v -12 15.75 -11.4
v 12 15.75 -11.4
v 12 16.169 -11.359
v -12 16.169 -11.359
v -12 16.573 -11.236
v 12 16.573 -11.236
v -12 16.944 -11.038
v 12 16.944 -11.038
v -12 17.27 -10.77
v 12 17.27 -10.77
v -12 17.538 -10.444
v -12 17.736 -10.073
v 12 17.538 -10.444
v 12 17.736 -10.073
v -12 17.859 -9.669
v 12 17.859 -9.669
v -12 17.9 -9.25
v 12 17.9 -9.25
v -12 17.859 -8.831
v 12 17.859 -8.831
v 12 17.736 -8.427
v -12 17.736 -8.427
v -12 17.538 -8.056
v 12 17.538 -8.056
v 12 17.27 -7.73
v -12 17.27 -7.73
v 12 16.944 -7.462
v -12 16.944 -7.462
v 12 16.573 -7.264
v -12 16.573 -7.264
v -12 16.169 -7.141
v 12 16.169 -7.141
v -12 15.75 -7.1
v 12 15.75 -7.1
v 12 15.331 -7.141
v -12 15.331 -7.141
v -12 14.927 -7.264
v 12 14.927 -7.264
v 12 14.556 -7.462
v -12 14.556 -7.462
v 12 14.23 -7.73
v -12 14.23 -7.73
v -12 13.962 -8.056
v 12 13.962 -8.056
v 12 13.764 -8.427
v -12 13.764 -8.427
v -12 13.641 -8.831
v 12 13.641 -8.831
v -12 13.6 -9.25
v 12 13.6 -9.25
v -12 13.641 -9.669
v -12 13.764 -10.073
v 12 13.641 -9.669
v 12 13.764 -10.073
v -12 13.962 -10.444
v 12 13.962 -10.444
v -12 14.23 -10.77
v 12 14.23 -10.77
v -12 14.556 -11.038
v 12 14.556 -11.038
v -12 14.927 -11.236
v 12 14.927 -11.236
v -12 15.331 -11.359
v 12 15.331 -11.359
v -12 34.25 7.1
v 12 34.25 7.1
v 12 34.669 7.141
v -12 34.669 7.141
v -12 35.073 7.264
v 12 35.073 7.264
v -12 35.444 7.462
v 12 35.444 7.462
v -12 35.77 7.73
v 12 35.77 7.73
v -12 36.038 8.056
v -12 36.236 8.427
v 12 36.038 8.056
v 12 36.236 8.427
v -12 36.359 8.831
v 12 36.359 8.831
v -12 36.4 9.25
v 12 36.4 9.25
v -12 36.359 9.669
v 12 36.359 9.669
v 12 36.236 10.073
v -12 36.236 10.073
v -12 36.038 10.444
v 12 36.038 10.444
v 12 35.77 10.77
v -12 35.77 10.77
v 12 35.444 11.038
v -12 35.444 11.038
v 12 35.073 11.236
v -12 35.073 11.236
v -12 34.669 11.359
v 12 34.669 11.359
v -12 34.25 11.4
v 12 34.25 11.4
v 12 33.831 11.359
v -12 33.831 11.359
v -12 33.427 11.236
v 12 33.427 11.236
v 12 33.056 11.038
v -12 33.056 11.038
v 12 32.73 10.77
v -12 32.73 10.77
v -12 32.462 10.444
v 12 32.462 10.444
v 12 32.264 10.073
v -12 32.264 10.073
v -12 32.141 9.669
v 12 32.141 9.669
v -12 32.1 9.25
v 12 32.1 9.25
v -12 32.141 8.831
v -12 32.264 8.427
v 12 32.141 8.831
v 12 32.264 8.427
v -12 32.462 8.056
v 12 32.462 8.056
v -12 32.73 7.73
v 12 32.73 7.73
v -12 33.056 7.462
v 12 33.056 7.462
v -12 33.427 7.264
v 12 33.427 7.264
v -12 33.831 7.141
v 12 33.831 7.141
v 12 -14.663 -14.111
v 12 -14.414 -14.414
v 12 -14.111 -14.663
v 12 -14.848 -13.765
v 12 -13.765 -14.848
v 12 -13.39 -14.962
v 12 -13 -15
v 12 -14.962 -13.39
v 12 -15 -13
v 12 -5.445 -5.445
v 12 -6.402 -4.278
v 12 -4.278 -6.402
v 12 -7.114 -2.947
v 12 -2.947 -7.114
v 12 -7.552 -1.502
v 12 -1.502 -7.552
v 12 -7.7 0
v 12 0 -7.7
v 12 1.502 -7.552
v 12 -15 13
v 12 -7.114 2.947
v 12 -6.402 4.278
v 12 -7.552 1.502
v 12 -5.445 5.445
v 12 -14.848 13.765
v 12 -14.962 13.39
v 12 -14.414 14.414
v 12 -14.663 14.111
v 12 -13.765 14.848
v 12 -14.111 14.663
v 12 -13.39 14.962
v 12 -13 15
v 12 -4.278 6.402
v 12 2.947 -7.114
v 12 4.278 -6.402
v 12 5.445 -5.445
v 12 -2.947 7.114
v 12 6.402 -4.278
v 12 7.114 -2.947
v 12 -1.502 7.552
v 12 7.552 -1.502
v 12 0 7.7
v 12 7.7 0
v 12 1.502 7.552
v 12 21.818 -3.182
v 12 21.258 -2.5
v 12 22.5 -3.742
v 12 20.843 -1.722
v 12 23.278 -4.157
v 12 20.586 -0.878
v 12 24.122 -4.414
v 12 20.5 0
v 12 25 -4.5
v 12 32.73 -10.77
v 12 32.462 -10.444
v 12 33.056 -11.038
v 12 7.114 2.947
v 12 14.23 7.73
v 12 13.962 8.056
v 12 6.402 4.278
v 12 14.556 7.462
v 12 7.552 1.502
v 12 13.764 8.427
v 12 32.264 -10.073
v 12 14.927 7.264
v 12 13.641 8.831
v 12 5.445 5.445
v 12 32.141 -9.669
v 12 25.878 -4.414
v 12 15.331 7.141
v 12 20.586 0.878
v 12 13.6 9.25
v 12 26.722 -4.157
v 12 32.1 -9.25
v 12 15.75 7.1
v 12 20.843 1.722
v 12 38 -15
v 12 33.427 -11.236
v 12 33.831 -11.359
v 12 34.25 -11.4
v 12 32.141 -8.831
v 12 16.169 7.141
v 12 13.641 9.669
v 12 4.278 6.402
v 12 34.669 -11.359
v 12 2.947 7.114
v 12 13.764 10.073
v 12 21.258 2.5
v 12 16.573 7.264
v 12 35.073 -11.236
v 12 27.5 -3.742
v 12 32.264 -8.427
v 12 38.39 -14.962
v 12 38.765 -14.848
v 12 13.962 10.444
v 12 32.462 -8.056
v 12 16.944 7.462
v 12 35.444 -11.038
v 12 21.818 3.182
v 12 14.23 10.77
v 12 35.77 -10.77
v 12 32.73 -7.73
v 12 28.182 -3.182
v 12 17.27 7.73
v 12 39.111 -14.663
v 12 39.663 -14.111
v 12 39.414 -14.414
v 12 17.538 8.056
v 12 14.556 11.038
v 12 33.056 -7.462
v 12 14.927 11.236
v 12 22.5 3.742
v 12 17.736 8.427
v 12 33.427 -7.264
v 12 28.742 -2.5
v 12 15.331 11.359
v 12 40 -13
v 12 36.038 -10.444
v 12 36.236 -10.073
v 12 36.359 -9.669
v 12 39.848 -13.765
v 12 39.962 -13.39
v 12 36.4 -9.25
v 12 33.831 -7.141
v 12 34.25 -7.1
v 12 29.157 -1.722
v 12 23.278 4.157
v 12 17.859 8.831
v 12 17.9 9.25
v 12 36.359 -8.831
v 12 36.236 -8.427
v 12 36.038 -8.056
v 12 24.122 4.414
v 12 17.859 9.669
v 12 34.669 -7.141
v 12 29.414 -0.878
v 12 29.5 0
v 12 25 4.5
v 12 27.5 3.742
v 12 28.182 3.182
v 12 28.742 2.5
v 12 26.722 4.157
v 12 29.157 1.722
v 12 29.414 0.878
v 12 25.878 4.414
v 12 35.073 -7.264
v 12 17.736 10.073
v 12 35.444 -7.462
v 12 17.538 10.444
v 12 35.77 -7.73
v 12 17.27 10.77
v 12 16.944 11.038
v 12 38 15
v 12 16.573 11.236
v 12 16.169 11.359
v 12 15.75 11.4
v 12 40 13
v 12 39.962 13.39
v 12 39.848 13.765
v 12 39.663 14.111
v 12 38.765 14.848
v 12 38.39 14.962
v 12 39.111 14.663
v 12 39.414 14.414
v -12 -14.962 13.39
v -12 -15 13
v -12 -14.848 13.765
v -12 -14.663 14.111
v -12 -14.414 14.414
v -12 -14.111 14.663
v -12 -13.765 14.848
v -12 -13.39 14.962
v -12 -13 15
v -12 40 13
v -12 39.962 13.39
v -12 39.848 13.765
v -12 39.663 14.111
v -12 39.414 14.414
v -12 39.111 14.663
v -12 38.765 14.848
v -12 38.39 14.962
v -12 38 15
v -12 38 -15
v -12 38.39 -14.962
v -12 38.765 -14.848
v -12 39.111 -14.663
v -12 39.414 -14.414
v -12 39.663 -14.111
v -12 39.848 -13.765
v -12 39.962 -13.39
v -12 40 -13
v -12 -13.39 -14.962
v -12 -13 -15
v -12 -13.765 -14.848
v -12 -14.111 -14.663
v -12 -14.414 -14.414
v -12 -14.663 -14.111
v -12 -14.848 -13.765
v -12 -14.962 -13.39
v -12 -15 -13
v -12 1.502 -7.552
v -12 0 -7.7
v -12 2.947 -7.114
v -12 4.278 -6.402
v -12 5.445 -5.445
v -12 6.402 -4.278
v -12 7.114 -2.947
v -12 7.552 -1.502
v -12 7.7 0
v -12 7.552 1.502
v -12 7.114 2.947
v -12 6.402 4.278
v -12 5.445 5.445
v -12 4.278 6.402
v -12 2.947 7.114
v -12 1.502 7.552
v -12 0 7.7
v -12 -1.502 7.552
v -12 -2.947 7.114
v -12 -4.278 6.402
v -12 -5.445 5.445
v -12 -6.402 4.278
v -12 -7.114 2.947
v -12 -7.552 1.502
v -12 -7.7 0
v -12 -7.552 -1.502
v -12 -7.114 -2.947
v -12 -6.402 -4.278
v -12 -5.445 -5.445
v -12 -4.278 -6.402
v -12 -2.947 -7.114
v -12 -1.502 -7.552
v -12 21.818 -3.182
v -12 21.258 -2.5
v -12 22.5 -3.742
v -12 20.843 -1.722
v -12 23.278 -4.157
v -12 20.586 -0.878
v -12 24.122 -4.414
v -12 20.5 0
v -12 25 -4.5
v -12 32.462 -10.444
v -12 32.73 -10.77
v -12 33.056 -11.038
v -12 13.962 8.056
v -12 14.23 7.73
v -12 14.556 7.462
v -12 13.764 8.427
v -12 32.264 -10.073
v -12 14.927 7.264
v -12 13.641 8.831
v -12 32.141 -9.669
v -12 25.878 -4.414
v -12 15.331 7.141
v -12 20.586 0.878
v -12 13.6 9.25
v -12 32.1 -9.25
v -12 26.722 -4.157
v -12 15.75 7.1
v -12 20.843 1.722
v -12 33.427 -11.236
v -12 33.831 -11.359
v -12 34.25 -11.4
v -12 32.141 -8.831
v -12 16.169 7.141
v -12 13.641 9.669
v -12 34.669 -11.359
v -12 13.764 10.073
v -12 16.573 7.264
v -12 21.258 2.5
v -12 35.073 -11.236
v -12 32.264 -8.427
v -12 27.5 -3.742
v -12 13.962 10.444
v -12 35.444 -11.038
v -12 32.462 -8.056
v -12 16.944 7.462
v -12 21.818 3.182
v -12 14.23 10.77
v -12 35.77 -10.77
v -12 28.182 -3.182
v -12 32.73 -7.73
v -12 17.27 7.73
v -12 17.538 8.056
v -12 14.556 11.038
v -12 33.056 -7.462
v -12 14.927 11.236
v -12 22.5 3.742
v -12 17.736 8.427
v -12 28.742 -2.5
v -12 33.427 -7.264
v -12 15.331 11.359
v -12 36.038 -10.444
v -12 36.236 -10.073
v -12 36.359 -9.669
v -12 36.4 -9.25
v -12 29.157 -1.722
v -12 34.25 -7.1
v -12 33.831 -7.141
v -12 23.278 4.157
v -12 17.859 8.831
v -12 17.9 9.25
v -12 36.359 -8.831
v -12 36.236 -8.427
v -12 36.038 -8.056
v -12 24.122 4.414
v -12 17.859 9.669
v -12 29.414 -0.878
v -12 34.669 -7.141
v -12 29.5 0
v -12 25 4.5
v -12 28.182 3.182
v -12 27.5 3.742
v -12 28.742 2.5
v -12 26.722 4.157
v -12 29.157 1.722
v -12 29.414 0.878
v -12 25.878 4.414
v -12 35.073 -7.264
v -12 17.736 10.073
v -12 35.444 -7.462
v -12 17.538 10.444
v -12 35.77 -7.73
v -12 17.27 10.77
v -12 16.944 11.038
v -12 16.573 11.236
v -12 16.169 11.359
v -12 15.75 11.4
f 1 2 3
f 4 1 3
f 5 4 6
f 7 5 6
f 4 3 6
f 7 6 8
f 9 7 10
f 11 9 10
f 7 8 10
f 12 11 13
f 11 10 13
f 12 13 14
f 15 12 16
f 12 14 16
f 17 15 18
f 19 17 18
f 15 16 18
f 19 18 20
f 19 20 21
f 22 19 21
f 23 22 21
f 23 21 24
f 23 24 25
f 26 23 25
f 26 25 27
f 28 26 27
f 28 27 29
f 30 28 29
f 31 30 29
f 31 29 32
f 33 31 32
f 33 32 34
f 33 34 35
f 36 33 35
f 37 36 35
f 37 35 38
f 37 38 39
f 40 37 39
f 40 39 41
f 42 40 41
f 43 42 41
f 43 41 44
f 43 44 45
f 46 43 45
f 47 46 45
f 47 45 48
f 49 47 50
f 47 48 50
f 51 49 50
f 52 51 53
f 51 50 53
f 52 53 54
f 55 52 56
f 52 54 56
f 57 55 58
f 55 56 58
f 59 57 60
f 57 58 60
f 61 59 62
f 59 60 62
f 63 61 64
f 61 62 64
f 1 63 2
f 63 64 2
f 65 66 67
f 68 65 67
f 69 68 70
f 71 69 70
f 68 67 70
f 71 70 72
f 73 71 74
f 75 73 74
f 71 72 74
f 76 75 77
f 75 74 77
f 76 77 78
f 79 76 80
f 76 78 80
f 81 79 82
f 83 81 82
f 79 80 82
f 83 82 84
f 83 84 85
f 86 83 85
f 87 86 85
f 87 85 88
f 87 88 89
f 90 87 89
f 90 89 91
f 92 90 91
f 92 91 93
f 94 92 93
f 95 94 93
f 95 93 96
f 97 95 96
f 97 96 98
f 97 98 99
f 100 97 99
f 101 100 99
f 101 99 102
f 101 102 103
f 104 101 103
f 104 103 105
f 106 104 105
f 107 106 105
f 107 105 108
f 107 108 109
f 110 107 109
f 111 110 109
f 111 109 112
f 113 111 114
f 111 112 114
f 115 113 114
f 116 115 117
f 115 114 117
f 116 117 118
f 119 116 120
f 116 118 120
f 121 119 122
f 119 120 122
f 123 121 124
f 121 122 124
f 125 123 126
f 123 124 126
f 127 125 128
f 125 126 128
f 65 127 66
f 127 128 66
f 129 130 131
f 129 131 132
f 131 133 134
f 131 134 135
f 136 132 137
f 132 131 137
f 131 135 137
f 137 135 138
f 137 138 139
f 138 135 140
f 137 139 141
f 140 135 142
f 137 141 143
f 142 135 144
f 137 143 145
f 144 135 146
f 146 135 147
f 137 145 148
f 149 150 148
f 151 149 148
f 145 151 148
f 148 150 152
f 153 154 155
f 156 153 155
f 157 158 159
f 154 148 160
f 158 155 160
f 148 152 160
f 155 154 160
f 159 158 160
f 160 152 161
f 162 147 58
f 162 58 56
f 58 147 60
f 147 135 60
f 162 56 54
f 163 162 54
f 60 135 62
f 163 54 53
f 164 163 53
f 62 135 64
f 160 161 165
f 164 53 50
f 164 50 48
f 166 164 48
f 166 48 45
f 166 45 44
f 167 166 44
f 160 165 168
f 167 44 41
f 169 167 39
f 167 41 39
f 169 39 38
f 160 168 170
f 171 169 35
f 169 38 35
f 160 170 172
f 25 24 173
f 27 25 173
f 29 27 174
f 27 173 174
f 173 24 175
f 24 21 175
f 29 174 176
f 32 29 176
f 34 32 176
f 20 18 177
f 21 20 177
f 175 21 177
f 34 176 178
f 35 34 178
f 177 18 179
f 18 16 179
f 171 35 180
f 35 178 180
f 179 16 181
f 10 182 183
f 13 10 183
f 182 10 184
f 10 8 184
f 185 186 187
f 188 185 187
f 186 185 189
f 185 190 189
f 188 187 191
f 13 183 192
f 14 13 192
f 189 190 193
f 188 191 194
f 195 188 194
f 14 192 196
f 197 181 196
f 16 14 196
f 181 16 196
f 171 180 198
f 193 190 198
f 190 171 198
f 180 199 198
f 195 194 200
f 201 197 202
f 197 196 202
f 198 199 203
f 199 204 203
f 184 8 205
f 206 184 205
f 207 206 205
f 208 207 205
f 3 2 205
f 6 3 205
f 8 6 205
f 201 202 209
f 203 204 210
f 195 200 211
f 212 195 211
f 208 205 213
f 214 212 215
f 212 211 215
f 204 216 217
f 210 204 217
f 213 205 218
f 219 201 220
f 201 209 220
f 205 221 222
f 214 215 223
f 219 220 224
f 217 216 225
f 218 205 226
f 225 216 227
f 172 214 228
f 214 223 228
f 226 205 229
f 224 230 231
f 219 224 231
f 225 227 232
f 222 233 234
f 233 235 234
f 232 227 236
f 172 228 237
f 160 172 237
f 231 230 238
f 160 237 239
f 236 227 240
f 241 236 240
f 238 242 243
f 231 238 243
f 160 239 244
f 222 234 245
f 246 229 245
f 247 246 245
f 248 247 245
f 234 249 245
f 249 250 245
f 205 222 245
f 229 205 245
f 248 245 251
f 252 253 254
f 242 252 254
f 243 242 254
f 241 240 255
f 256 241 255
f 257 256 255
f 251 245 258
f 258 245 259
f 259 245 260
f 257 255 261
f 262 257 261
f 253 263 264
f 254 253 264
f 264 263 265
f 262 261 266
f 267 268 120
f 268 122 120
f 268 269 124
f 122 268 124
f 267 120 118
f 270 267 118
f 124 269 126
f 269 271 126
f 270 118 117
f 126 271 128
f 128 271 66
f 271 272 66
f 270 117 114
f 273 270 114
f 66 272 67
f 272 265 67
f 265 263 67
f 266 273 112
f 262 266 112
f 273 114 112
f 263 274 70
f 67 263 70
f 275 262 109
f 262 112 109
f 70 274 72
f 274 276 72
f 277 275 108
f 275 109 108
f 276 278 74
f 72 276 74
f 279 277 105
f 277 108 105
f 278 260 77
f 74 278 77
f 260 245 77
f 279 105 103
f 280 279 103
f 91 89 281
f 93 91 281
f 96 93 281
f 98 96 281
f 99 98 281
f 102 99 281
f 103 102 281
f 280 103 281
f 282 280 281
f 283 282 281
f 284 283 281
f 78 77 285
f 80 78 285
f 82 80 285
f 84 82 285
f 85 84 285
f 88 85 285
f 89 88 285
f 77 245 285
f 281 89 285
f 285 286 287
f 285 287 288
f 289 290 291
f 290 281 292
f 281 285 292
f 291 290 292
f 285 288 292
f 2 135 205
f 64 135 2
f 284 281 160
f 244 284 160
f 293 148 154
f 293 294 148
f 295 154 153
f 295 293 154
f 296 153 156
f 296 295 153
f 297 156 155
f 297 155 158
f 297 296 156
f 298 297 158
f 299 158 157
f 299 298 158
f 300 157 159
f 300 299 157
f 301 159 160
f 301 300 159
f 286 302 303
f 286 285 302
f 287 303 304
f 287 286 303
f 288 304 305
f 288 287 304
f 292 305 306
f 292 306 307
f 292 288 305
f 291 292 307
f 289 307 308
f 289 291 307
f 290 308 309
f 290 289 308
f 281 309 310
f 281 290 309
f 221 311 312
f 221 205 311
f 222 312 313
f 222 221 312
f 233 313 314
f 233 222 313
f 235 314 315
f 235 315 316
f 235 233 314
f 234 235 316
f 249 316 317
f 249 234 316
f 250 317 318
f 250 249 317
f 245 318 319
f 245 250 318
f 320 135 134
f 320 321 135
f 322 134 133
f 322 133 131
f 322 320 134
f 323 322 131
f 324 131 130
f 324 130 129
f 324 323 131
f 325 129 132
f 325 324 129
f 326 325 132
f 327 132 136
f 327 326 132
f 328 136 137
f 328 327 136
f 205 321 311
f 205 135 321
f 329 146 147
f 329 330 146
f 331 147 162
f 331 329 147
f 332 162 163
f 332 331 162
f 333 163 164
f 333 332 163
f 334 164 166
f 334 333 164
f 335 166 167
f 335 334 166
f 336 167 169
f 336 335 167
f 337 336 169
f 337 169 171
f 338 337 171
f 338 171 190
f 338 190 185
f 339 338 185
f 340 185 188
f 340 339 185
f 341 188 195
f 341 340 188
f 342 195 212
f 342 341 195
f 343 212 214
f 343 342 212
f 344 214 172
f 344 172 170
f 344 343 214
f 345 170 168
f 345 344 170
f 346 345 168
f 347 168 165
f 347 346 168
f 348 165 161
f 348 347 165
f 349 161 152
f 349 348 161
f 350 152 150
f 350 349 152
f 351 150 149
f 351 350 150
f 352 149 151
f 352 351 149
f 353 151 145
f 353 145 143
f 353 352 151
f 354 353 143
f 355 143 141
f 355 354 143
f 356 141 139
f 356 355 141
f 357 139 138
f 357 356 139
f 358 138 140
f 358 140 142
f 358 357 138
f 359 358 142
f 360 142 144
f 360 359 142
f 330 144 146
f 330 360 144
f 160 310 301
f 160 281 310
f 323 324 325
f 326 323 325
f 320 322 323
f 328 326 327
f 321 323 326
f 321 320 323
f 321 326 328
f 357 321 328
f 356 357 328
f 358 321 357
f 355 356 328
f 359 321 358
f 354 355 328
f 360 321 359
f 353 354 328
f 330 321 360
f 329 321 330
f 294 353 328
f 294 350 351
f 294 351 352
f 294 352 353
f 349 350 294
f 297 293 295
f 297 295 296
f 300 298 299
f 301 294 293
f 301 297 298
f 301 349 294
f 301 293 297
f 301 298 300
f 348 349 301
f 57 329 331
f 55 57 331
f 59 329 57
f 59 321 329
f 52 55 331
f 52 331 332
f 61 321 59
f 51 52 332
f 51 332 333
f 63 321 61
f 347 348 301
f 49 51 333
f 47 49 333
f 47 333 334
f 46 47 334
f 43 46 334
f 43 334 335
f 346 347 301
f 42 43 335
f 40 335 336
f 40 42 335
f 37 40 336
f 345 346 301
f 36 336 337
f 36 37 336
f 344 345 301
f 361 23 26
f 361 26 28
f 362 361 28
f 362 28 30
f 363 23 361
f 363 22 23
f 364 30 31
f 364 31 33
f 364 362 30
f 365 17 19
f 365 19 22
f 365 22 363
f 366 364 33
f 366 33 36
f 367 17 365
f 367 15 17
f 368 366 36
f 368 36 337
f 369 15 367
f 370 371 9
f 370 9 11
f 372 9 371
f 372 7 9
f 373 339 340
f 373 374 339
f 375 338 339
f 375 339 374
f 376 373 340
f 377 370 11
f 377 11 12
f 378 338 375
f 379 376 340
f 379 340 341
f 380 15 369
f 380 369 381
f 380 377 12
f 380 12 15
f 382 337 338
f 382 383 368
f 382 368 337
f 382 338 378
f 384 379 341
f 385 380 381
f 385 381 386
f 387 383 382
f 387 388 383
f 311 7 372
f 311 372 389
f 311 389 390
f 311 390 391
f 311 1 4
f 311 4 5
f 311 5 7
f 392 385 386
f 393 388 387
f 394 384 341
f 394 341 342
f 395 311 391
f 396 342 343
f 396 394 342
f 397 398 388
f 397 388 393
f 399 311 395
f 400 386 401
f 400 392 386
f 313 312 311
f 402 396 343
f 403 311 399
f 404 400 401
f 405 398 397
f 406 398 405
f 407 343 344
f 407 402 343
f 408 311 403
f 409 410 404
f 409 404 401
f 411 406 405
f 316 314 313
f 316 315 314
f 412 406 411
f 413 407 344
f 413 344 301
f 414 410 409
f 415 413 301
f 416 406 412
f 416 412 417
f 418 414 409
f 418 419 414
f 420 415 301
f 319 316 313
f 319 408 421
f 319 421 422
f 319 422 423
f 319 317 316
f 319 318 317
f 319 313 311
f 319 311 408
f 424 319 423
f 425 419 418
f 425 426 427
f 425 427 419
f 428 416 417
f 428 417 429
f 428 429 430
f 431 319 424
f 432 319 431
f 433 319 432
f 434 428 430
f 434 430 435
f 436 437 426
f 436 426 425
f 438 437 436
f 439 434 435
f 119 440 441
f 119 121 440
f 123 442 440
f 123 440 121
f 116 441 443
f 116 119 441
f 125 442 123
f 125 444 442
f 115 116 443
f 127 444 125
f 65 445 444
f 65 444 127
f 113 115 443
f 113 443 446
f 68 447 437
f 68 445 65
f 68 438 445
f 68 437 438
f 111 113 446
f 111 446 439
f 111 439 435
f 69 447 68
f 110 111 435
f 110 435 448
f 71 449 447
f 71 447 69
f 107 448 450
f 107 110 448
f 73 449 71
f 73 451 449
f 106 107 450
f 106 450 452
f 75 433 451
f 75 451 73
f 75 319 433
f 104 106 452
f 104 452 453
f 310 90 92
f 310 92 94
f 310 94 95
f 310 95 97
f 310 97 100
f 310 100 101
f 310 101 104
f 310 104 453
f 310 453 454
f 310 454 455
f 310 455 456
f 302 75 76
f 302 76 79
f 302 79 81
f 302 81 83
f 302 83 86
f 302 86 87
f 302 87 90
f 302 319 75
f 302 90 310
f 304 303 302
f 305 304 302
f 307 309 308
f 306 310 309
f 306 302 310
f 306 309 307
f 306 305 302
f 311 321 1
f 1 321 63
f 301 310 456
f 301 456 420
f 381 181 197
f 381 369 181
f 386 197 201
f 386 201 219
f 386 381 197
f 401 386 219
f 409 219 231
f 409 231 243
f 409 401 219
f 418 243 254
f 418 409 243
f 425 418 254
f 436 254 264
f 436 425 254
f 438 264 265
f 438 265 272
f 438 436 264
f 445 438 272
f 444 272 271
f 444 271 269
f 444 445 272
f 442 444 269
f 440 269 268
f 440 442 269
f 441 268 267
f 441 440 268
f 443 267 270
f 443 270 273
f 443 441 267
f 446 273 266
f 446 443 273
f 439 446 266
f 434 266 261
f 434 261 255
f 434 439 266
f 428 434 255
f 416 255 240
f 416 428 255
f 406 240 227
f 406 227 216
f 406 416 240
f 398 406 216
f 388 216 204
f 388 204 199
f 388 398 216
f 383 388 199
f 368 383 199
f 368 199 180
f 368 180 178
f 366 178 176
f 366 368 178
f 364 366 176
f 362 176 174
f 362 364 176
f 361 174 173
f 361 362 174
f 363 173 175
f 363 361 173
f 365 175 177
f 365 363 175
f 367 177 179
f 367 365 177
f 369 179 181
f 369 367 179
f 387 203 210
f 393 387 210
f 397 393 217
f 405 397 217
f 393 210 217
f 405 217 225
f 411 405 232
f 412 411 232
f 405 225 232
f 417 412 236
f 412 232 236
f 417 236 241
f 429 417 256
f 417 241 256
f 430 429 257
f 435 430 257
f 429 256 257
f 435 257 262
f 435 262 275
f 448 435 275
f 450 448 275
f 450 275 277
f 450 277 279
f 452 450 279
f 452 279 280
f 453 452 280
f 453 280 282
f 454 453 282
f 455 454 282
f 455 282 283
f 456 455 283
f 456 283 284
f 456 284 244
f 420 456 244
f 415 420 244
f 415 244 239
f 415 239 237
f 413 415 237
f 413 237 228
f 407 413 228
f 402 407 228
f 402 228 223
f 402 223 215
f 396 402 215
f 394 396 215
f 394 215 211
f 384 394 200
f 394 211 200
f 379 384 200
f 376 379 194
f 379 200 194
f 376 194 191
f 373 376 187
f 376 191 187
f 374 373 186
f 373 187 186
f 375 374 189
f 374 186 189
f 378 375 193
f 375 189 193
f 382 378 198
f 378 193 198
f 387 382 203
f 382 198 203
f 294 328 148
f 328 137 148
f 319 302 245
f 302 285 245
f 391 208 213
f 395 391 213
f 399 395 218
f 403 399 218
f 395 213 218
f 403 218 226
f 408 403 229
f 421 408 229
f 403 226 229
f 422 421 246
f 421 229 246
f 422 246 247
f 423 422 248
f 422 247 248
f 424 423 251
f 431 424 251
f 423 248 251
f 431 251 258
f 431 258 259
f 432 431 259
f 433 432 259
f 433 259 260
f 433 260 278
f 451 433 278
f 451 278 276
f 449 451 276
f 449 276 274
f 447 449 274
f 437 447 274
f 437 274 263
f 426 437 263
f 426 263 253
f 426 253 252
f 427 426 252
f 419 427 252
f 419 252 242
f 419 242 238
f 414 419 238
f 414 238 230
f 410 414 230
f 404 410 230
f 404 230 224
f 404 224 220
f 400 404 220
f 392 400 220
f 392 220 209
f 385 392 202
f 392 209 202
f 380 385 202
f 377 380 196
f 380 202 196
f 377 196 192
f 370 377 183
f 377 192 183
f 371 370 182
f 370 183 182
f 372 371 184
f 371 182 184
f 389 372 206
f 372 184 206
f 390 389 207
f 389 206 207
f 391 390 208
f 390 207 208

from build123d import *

# Parameters (mm, degrees)
SKETCH1_R           = 7.7
SKETCH1_R_2         = 4.5
BOSS_EXTRUDE1_DEPTH = 12
SKETCH2_R           = 2.15
CUT_EXTRUDE1_DEPTH  = 25
FILLET1_R           = 2


with BuildPart() as part:
    # Sketch1 → Boss-Extrude1 (new body, symmetric)
    with BuildSketch(Plane(origin=(0, 0, 0), x_dir=(0, 0, -1), z_dir=(1, 0, 0))):
        Polygon((15, 10), (15, -15), (-15, -15), (-15, 10), (-15, 40), (15, 40), align=None)
        Circle(SKETCH1_R, mode=Mode.SUBTRACT)
        with Locations((0, 25)):
            Circle(SKETCH1_R_2, mode=Mode.SUBTRACT)
    extrude(amount=BOSS_EXTRUDE1_DEPTH, both=True)

    # Sketch2 → Cut-Extrude1 (cut, through all)
    with BuildSketch(Plane(origin=(12, 0, 0), x_dir=(0, 0, -1), z_dir=(1, 0, 0))):
        with Locations((-9.25, 34.25)):
            Circle(SKETCH2_R)
        with Locations((-9.25, 15.75)):
            Circle(SKETCH2_R)
        with Locations((9.25, 34.25)):
            Circle(SKETCH2_R)
        with Locations((9.25, 15.75)):
            Circle(SKETCH2_R)
    extrude(amount=-CUT_EXTRUDE1_DEPTH, mode=Mode.SUBTRACT)

    # Fillet1
    fillet1_edges = [part.edges().sort_by_distance(p)[0] for p in [
        (0, 40, 15),
        (0, 40, -15),
        (0, -15, -15),
        (0, -15, 15),
    ]]
    fillet(fillet1_edges, radius=FILLET1_R)


solid = part.part
